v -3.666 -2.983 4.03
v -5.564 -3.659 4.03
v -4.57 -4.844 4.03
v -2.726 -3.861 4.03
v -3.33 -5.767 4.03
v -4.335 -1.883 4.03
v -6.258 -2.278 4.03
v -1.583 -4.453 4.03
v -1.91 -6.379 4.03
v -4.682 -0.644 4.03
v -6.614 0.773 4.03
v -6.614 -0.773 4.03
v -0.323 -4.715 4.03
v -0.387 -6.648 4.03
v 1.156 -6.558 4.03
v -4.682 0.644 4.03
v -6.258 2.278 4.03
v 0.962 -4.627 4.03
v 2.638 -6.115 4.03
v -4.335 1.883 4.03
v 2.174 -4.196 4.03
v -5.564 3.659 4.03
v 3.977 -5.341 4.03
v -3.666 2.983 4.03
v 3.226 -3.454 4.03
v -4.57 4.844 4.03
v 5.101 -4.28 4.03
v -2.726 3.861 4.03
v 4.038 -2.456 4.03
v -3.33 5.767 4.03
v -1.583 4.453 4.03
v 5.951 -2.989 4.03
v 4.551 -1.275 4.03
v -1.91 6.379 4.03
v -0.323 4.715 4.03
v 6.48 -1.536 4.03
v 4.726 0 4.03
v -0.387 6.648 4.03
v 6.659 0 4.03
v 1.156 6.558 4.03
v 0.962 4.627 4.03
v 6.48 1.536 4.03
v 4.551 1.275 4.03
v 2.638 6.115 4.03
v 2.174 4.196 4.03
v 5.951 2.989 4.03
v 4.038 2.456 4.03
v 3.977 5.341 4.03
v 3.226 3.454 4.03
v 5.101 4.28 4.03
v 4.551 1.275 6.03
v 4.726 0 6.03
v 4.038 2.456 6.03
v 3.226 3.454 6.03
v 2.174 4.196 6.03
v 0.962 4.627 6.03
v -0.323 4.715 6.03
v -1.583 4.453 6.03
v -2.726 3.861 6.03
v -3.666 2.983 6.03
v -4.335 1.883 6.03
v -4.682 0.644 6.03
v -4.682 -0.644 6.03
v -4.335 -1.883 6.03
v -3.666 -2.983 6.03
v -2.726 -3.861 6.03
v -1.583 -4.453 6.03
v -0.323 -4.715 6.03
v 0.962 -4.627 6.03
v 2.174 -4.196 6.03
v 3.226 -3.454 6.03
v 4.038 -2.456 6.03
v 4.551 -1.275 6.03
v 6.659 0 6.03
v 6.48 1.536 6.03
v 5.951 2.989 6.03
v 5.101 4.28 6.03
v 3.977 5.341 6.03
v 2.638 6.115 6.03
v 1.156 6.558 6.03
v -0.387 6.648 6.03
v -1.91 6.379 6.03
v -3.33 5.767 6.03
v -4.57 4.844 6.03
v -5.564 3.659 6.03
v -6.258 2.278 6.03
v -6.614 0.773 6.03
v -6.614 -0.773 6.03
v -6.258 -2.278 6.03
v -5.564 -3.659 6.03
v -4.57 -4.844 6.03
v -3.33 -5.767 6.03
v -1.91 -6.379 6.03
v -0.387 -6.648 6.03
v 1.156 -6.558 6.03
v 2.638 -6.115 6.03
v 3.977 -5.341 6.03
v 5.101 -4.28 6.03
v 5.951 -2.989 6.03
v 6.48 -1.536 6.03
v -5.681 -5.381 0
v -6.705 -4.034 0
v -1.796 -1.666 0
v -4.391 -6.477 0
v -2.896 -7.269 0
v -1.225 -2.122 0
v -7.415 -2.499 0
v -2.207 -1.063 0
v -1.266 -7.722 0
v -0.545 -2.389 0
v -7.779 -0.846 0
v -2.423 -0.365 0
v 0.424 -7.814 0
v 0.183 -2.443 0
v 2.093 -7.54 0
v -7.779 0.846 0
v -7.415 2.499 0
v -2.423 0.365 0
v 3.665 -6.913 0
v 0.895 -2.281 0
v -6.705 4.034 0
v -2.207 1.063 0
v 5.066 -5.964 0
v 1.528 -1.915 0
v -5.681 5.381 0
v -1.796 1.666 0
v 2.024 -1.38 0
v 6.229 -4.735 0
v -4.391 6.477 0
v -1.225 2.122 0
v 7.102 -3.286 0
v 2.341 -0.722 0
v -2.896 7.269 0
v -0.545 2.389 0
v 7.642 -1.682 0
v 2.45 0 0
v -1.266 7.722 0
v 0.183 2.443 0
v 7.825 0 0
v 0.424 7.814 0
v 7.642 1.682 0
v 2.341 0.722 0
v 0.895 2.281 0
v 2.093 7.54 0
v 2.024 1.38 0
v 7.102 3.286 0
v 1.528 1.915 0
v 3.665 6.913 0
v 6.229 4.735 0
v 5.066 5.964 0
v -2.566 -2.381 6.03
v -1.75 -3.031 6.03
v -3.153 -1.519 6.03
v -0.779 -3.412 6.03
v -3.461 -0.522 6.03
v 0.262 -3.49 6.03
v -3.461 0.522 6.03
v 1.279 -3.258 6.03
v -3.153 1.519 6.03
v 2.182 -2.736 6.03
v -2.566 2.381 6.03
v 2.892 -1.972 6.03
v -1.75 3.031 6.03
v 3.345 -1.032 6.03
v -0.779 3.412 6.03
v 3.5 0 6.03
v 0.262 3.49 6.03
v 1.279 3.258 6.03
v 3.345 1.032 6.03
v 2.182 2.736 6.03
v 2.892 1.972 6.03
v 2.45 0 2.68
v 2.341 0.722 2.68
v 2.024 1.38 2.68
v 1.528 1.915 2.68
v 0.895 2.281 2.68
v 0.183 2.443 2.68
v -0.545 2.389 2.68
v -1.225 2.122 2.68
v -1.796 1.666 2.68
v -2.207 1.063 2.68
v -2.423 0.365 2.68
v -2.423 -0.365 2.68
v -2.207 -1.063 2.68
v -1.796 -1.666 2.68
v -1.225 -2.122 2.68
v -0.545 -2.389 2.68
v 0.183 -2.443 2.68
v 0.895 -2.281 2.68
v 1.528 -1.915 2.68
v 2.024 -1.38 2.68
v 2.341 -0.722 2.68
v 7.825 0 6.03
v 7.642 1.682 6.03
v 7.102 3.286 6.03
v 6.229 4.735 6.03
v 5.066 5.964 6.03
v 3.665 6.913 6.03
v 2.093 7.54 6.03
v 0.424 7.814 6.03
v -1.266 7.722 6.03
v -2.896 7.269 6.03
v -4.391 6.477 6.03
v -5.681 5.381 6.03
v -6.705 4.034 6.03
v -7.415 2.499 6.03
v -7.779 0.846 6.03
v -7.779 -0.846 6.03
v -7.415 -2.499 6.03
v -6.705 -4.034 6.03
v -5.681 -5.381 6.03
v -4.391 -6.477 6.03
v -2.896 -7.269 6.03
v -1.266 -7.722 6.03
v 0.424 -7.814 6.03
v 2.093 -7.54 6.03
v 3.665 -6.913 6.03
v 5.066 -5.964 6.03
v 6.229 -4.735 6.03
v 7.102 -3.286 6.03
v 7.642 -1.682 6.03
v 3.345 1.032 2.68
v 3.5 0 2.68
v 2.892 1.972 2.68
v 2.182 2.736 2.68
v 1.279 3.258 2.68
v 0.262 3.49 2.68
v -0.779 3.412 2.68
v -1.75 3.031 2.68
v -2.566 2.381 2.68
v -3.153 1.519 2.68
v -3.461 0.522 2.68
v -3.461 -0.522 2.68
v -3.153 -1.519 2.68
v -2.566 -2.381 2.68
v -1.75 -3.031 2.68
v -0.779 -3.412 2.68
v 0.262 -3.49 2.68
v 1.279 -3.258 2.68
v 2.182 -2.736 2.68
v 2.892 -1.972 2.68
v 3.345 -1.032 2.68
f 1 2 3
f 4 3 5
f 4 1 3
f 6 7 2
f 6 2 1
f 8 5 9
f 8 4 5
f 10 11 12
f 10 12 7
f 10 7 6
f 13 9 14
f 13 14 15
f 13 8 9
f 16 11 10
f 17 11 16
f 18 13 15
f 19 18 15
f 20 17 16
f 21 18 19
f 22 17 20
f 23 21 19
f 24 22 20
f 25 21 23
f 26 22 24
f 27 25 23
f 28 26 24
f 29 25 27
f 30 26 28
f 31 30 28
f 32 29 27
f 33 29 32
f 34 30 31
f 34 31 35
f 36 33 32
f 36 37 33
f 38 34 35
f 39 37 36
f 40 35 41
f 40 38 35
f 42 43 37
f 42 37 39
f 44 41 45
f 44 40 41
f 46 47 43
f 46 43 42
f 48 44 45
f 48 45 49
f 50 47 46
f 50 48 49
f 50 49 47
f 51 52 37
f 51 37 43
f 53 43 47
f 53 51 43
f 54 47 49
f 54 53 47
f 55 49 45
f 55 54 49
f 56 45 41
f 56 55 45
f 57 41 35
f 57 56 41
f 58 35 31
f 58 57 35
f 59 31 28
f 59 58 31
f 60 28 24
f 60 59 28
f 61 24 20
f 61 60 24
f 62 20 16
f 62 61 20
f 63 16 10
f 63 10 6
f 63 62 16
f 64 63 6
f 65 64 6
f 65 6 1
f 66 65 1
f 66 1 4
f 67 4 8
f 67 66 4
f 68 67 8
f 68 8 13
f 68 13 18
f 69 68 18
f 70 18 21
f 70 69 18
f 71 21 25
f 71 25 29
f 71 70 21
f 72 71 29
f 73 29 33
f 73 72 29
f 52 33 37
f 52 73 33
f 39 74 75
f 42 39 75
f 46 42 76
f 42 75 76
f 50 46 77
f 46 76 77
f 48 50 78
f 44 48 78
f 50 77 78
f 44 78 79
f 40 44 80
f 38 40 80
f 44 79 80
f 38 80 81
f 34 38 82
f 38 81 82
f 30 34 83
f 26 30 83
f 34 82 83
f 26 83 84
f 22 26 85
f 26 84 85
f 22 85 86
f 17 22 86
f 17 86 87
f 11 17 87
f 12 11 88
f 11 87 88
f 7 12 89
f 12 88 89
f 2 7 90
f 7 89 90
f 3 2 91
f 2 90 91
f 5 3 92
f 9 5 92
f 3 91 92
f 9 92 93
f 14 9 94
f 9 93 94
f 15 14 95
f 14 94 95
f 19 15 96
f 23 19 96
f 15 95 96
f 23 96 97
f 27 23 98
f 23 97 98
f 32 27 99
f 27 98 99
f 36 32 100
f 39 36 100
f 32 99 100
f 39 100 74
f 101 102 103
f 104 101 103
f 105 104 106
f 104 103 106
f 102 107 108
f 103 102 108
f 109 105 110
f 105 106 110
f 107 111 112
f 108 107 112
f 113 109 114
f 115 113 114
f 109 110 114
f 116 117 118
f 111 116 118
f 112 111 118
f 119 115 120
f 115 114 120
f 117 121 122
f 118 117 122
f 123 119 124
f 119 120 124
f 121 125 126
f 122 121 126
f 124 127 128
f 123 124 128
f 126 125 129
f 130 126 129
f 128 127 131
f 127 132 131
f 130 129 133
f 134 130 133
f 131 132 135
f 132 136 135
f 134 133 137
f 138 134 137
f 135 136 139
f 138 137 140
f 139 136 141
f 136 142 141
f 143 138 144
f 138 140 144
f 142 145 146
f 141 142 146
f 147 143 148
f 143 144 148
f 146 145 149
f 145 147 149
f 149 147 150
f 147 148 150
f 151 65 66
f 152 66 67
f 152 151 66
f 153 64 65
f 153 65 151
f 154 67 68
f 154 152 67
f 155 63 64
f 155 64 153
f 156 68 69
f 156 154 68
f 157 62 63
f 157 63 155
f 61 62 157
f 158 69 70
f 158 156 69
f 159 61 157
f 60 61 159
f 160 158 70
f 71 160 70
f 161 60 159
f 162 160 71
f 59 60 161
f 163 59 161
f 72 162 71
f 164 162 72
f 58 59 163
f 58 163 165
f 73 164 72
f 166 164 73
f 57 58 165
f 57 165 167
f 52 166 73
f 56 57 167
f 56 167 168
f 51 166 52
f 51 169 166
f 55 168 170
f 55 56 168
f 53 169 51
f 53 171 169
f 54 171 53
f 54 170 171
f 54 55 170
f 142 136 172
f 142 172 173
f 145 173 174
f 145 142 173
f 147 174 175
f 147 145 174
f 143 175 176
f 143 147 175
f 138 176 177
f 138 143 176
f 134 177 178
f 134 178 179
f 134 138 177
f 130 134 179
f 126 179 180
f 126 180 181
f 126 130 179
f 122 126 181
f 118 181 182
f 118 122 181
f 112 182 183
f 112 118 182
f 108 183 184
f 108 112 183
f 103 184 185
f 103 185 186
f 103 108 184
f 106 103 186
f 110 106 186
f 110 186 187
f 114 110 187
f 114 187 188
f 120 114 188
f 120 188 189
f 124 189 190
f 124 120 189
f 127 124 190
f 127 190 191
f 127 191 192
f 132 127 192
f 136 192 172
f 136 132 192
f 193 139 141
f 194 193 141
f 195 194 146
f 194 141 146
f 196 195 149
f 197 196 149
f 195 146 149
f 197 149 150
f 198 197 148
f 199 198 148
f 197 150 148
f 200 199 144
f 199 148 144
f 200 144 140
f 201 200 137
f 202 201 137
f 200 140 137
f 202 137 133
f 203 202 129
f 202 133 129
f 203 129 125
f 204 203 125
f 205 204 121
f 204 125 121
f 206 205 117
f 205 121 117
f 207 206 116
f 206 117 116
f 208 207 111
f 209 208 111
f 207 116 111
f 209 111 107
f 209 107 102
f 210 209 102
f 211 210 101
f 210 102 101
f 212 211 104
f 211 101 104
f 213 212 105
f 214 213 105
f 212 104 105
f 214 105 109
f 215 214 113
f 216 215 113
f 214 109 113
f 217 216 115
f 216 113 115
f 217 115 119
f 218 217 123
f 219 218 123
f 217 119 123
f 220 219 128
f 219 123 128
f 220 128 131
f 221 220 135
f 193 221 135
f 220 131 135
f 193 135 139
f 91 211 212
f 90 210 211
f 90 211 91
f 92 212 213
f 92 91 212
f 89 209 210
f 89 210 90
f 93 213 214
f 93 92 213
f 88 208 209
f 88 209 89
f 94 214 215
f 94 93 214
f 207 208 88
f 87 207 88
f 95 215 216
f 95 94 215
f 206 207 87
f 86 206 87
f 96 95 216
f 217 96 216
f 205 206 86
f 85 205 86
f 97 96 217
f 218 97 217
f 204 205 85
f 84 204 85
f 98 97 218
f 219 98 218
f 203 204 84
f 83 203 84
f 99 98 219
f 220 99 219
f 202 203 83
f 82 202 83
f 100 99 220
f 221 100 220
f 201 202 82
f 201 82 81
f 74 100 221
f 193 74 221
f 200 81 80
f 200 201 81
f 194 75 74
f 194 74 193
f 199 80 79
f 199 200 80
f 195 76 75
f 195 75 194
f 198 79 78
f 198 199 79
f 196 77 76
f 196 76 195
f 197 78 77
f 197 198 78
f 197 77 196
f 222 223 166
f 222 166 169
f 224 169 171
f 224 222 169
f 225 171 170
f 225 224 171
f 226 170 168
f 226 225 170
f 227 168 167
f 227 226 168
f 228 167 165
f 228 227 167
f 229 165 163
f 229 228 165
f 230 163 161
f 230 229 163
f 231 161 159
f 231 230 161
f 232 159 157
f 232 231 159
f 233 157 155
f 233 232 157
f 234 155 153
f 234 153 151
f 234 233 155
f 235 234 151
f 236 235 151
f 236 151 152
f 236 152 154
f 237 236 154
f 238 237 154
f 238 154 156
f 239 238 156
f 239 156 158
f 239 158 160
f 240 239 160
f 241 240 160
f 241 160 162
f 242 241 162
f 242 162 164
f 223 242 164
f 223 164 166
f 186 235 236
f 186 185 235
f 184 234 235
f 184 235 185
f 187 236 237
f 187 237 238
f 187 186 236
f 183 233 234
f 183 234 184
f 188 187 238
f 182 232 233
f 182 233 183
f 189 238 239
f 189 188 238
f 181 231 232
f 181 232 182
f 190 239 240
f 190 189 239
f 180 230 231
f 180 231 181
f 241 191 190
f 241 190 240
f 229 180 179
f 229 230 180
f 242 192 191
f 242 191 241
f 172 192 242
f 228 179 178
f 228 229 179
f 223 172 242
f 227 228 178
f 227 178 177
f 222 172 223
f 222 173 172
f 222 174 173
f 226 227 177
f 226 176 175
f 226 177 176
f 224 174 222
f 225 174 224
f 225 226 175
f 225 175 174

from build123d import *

# Parameters (mm, degrees)
F0_R     = 7.825
F0_R_2   = 3.5
F1_DEPTH = 6.03
F0_R_3   = 2.45
F2_DEPTH = 2.68
F3_R     = 6.65919
F3_R_2   = 4.726229
F4_DEPTH = 2


with BuildPart() as f1:
    # F0 (on Top) → F1 (new body)
    with BuildSketch(Plane.XY):
        Circle(F0_R)
        Circle(F0_R_2, mode=Mode.SUBTRACT)
    extrude(amount=F1_DEPTH)

    # F0 (on Top) → F2 (join)
    with BuildSketch(Plane.XY):
        Circle(F0_R_2)
        Circle(F0_R_3, mode=Mode.SUBTRACT)
    extrude(amount=F2_DEPTH)

    # F3 (on face) → F4 (cut)
    with BuildSketch(Plane.XY.offset(6.03)):
        Circle(F3_R)
        Circle(F3_R_2, mode=Mode.SUBTRACT)
    extrude(amount=-F4_DEPTH, mode=Mode.SUBTRACT)


solid = f1.part
